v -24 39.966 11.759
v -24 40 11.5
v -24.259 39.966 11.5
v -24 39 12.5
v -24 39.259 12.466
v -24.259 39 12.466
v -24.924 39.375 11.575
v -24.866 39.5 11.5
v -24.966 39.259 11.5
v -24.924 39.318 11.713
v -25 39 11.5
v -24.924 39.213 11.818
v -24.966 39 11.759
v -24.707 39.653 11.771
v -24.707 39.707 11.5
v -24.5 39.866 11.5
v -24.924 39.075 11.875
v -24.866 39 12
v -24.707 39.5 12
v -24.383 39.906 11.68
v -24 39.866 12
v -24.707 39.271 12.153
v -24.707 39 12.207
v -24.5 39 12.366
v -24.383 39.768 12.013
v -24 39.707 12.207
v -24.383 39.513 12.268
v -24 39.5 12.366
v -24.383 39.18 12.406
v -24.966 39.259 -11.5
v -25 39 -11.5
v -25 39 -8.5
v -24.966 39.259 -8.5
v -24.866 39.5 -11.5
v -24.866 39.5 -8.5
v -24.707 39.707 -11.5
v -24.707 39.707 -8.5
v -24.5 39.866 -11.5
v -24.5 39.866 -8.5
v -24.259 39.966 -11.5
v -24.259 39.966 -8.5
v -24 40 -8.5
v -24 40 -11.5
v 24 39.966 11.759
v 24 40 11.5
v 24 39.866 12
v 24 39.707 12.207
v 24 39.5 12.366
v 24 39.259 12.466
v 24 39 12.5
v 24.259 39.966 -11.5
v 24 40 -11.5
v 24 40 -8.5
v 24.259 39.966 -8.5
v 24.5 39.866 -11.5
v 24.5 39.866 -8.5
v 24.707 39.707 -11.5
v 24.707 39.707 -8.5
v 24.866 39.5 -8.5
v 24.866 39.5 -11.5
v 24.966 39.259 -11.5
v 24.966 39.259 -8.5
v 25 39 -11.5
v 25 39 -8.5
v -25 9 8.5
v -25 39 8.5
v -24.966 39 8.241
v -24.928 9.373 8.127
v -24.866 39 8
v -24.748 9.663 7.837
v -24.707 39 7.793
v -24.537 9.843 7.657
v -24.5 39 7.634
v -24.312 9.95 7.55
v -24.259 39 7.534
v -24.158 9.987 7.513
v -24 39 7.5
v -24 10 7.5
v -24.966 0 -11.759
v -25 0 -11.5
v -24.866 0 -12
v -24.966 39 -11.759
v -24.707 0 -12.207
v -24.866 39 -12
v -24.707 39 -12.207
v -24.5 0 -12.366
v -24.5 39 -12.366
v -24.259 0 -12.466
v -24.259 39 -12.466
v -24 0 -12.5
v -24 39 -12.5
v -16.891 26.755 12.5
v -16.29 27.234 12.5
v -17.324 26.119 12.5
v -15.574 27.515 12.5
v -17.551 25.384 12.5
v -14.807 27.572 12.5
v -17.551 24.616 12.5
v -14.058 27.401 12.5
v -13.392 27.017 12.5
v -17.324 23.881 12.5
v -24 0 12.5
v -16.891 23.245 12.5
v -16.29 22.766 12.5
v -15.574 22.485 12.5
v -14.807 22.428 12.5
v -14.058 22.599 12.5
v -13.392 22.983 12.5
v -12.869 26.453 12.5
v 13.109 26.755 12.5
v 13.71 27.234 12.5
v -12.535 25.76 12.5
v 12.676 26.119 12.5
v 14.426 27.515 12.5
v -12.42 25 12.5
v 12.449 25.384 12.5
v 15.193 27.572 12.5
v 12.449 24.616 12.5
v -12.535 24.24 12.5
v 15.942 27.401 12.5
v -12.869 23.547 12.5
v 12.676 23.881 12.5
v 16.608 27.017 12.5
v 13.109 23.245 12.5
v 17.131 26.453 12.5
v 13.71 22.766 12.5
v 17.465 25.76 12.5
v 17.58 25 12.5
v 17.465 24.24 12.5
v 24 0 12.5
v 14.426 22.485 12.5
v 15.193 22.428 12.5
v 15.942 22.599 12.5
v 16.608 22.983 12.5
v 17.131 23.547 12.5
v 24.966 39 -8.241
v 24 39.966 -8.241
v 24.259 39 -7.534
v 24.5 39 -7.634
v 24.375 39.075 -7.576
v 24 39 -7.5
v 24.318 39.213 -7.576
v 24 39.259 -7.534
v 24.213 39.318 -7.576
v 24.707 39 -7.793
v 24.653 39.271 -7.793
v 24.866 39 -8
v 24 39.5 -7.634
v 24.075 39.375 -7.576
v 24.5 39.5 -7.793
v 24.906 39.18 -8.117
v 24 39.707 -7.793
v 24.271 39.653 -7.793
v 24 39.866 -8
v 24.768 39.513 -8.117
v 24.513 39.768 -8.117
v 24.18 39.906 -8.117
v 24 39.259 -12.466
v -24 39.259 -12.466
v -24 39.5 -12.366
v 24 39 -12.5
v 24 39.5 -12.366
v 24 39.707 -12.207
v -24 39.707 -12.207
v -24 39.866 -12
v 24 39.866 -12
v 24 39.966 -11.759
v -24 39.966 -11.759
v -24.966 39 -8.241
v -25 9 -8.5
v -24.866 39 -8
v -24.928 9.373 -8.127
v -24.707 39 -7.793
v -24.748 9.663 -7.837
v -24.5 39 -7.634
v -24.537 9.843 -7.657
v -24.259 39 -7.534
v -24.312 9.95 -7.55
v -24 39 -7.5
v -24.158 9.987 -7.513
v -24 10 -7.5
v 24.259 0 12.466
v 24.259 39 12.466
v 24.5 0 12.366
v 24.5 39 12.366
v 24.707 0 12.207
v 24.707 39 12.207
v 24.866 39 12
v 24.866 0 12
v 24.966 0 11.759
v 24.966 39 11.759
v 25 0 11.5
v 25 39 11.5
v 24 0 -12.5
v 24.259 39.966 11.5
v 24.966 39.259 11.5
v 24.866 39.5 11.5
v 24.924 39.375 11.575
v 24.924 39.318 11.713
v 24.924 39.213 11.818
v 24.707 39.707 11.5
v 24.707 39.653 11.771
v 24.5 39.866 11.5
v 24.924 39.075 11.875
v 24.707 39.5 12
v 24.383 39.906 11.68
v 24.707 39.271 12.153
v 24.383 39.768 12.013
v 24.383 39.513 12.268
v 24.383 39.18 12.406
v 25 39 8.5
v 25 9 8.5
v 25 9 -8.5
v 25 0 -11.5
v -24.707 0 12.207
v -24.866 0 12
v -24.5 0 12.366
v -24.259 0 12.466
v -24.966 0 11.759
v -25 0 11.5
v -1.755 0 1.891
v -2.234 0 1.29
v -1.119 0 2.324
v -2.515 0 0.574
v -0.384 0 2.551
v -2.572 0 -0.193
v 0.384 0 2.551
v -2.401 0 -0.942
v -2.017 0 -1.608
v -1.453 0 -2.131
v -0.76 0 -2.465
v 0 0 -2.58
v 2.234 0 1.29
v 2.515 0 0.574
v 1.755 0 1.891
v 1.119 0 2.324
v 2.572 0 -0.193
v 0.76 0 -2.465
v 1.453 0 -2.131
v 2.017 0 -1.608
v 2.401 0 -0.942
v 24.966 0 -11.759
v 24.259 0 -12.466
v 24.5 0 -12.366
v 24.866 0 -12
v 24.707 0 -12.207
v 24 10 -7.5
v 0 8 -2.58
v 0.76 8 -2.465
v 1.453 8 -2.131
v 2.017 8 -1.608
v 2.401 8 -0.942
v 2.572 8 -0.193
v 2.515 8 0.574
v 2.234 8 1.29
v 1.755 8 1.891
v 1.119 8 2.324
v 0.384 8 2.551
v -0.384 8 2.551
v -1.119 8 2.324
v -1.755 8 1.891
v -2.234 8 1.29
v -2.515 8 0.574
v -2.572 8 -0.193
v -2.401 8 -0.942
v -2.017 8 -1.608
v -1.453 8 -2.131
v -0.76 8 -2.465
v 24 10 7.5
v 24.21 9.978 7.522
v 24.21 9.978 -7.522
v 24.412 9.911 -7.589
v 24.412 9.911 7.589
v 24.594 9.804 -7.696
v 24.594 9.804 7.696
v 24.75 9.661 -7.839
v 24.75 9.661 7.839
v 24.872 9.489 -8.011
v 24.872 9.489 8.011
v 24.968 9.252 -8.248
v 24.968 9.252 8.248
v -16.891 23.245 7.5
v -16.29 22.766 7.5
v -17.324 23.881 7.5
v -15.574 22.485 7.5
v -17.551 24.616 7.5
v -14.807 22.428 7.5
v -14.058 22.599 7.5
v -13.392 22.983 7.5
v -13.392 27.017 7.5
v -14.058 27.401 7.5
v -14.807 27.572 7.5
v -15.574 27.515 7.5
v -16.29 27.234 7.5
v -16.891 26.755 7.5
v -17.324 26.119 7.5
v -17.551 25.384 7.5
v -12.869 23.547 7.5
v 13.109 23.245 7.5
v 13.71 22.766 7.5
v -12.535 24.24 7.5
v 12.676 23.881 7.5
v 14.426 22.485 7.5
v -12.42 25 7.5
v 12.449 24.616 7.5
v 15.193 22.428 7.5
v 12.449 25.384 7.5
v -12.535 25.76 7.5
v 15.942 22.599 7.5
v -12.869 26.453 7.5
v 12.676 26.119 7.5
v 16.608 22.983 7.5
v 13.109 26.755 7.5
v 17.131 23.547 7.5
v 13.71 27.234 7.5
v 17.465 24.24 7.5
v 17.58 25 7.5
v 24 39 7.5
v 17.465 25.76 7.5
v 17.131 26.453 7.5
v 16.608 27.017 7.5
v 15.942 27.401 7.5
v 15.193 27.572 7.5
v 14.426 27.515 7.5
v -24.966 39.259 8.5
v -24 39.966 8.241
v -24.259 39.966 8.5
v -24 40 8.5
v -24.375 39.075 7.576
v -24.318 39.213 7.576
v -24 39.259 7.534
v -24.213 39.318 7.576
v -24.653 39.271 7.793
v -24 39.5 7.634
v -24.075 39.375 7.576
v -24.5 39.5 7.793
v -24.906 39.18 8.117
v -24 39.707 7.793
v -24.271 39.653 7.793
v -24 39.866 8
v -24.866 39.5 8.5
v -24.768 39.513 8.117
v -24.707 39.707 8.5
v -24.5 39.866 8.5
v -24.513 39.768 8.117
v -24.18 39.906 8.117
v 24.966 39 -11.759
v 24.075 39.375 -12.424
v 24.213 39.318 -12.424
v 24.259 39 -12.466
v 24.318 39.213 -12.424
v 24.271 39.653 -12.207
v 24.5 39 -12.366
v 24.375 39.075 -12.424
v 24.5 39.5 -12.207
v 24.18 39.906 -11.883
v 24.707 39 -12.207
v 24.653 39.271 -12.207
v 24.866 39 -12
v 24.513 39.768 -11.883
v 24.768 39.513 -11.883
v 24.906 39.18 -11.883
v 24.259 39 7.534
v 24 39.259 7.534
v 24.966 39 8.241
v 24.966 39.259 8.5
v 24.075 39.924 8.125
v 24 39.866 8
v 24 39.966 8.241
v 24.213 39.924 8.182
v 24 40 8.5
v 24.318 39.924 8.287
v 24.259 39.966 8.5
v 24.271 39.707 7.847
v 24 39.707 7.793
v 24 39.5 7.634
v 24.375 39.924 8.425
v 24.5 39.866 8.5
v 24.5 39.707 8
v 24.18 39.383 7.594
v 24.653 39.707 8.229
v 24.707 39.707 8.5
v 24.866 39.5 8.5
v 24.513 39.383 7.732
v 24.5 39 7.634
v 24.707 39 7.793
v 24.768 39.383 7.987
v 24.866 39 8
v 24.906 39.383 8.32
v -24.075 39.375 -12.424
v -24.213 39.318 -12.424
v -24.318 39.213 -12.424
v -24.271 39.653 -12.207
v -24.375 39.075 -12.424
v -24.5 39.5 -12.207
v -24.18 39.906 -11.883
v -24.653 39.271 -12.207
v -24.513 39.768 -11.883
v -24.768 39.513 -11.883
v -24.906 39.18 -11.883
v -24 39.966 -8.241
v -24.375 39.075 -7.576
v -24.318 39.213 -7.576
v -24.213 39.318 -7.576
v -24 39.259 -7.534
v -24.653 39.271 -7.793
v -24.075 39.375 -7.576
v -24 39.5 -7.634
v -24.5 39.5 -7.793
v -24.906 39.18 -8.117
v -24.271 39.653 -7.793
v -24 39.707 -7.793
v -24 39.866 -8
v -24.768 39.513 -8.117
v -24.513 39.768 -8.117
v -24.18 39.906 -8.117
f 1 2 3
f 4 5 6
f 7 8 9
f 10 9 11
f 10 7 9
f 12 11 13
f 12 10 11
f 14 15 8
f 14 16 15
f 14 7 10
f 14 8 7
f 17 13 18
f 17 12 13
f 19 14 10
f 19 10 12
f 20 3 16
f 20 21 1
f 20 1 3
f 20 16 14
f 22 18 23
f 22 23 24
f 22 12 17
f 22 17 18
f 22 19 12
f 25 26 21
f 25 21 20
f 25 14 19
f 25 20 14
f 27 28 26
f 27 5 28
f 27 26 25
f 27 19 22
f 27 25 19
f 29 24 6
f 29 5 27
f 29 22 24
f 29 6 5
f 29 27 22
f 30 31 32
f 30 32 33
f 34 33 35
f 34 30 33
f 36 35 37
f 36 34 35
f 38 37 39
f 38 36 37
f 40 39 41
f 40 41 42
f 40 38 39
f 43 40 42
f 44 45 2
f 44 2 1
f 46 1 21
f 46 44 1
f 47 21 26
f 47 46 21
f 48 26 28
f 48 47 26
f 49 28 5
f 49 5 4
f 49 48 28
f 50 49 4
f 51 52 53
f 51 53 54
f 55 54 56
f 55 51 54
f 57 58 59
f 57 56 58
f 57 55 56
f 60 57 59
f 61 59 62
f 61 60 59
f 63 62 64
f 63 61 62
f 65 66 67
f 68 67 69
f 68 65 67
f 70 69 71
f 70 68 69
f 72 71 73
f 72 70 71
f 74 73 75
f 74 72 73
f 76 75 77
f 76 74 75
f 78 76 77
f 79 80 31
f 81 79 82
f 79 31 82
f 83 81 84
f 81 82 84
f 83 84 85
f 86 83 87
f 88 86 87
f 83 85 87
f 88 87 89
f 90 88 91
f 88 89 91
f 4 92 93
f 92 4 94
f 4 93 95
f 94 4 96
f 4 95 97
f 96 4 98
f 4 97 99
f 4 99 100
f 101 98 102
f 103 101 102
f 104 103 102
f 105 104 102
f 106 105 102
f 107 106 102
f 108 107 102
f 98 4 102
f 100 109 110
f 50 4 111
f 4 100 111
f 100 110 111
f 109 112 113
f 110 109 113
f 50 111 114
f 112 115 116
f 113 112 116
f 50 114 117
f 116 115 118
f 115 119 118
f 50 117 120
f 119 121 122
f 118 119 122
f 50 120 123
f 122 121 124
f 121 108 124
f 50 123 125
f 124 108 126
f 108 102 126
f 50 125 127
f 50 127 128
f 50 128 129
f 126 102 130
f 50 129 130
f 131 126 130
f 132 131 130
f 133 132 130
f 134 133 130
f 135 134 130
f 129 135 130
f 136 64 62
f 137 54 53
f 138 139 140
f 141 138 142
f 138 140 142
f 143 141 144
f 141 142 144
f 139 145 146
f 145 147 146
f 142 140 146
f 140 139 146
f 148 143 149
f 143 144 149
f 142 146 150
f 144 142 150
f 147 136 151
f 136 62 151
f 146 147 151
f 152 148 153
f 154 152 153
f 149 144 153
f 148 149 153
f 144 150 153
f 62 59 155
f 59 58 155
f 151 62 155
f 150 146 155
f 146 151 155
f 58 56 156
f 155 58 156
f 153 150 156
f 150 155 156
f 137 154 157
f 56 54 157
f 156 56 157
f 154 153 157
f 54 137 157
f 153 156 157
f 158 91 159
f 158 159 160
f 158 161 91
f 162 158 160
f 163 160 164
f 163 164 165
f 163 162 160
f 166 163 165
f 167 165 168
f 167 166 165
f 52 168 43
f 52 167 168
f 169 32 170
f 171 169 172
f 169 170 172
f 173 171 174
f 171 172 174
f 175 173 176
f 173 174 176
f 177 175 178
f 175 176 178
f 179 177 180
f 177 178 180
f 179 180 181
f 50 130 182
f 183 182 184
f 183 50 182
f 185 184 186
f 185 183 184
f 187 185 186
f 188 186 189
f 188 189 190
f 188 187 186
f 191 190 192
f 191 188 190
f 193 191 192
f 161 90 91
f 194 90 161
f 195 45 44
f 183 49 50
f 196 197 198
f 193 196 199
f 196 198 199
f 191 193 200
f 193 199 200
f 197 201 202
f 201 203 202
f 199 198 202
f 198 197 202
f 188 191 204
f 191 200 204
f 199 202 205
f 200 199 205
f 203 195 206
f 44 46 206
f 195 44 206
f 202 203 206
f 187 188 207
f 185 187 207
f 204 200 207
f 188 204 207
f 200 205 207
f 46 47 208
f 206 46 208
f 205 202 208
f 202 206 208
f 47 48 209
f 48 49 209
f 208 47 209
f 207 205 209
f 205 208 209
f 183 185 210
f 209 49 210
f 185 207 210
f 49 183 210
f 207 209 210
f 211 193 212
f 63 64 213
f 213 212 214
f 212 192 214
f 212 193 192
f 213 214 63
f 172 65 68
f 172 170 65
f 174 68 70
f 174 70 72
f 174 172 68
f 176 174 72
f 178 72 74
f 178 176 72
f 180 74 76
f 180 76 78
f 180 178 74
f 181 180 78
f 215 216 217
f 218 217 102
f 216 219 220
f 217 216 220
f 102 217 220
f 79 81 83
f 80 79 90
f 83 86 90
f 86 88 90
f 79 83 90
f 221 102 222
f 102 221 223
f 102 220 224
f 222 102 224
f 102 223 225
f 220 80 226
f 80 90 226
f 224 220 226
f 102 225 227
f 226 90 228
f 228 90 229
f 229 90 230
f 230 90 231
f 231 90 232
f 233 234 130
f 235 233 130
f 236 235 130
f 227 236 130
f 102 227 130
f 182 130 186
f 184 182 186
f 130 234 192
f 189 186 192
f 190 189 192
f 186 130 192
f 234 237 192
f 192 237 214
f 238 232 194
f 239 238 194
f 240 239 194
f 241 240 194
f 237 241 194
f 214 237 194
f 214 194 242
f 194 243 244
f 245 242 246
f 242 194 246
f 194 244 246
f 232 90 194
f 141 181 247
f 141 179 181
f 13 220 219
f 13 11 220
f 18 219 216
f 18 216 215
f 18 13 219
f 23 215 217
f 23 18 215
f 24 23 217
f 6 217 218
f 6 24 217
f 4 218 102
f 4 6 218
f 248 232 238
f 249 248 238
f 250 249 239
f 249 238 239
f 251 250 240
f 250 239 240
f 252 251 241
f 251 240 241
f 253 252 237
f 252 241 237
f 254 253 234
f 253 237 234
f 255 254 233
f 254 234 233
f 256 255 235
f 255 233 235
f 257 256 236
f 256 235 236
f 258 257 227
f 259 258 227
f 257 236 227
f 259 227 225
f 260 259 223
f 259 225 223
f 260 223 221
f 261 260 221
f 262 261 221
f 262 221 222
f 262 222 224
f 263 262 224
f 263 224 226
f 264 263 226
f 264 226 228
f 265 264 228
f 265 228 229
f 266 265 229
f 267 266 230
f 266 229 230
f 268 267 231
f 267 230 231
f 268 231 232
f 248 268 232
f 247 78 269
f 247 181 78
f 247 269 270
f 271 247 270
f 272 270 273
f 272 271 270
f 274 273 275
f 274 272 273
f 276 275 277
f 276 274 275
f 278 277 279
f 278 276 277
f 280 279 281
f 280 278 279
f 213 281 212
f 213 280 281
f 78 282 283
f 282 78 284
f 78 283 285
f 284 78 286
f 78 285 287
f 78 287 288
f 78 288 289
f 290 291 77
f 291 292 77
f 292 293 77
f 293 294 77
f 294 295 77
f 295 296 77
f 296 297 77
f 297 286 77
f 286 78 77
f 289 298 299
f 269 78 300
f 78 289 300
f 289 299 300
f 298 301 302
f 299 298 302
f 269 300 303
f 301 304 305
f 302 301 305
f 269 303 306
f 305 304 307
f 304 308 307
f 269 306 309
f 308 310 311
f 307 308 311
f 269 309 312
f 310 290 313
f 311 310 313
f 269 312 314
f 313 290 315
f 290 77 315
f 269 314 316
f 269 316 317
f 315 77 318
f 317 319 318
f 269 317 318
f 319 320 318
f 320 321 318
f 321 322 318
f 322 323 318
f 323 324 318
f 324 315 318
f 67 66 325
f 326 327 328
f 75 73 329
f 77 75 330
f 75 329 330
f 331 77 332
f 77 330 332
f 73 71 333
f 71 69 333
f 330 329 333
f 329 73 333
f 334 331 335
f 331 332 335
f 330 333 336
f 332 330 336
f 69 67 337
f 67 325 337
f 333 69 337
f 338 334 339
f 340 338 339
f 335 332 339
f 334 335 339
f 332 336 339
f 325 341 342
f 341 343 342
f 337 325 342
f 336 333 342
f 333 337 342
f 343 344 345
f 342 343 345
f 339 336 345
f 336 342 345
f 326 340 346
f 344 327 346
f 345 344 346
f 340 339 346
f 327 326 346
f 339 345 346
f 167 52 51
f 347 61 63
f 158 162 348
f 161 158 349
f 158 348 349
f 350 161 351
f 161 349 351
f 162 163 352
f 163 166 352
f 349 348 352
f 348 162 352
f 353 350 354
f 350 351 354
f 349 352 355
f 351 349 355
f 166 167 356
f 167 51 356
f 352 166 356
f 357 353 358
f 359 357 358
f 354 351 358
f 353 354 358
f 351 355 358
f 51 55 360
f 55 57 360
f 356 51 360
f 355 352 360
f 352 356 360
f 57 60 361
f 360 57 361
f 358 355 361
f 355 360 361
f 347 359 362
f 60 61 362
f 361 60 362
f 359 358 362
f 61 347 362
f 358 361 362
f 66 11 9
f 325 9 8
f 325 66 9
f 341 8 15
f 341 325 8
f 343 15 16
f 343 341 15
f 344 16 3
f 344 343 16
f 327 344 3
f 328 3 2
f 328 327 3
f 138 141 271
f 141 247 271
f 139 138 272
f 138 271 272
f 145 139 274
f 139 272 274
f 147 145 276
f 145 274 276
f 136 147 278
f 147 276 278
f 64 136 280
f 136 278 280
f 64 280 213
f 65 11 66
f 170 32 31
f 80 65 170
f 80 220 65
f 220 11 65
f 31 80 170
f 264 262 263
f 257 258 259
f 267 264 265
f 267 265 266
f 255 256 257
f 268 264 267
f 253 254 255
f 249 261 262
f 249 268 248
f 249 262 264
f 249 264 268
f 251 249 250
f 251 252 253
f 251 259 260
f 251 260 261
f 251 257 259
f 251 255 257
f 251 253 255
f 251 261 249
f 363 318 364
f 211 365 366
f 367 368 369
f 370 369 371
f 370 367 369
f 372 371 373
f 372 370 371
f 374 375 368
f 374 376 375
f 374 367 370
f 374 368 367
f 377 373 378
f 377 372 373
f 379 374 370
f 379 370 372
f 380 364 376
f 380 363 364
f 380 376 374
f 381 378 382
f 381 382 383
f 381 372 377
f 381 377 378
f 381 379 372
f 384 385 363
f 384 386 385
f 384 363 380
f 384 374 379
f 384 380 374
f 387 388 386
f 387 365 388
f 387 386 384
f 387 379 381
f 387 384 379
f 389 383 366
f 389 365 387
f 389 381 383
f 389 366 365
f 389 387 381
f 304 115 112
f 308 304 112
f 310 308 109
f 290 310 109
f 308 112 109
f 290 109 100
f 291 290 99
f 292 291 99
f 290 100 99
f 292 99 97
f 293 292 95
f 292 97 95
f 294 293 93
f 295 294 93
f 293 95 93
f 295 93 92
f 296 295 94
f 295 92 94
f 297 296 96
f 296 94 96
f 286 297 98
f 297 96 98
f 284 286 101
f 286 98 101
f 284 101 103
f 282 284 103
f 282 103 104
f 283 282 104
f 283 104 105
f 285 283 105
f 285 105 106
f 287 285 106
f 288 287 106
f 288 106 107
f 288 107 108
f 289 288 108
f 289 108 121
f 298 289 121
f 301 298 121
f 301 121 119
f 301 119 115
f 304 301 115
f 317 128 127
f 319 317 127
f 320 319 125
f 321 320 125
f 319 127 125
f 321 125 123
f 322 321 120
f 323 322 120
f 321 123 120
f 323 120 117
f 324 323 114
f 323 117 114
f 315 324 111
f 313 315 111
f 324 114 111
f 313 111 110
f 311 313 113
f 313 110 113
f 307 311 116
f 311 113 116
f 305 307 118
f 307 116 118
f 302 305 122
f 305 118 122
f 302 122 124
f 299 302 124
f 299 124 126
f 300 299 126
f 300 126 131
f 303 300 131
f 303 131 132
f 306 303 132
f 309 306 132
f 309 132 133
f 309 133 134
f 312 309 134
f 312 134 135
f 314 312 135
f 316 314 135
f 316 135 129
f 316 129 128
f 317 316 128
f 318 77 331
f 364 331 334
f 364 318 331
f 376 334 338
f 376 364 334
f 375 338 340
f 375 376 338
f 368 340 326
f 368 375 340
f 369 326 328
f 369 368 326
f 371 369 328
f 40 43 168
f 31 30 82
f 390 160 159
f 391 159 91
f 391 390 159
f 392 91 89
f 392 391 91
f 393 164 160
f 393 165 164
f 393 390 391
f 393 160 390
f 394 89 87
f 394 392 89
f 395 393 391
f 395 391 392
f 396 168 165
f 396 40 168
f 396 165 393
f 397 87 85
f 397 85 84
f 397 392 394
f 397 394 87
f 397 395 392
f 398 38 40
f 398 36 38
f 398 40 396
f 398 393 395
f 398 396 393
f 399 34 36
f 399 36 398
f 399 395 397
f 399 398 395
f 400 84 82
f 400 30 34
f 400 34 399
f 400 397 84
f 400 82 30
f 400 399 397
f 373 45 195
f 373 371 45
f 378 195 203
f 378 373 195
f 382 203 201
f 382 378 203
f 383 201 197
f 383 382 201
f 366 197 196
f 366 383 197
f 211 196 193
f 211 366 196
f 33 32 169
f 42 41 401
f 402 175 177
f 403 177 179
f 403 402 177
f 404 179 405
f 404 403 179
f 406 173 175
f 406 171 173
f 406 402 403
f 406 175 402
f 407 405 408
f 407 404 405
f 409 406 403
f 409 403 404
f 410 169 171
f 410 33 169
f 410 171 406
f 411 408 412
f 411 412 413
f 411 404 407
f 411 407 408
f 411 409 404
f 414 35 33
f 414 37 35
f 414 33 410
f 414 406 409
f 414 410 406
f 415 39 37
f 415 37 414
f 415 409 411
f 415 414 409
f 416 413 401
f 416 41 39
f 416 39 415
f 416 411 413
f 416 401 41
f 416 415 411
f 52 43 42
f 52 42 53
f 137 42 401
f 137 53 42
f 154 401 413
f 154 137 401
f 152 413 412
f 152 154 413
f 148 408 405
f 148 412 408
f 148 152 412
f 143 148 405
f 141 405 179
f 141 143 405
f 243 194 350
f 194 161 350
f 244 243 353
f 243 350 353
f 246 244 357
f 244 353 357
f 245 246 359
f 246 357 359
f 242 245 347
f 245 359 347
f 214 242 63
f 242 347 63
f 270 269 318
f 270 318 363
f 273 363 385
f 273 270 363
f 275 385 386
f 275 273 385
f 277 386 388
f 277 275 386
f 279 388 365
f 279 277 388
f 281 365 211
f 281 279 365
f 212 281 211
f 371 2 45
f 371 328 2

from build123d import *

# Parameters (mm, degrees)
SKETCH1_W           = 50
SKETCH1_H           = 25
BOSS_EXTRUDE1_DEPTH = 40
SKETCH2_W           = 50
SKETCH2_H           = 15
CUT_EXTRUDE1_DEPTH  = 30
FILLET1_R           = 1
CUT_EXTRUDE2_REACH  = 55.385
SKETCH3_R           = 2.5796875
SKETCH3_R_2         = 2.579687
SKETCH4_R           = 2.57968
CUT_EXTRUDE3_DEPTH  = 8


with BuildPart() as part:
    # Sketch1 → Boss-Extrude1 (new body)
    with BuildSketch(Plane(origin=(0, 0, 0), x_dir=(1, 0, 0), z_dir=(0, 1, 0))):
        Rectangle(SKETCH1_W, SKETCH1_H)
    extrude(amount=BOSS_EXTRUDE1_DEPTH)

    # Sketch2 → Cut-Extrude1 (cut)
    with BuildSketch(Plane(origin=(0, 40, 0), x_dir=(1, 0, 0), z_dir=(0, 1, 0))):
        Rectangle(SKETCH2_W, SKETCH2_H)
    extrude(amount=-CUT_EXTRUDE1_DEPTH, mode=Mode.SUBTRACT)

    # Fillet1
    fillet1_edges = [part.edges().sort_by_distance(p)[0] for p in [
        (-25, 40, -10),
        (0, 40, 12.5),
        (25, 40, -10),
        (-25, 40, 10),
        (25, 10, 0),
        (25, 25, -7.5),
        (25, 25, 7.5),
        (-25, 10, 0),
        (-25, 25, 7.5),
        (-25, 25, -7.5),
        (0, 40, -7.5),
        (0, 40, 7.5),
        (25, 40, 10),
        (0, 40, -12.5),
        (25, 20, 12.5),
        (-25, 20, 12.5),
        (-25, 20, -12.5),
        (25, 20, -12.5),
    ]]
    fillet(fillet1_edges, radius=FILLET1_R)

    # Sketch3 → Cut-Extrude2 (cut, up to next)
    with BuildSketch(Plane.XY.offset(12.5), mode=Mode.PRIVATE) as cut_extrude2_sk1:
        with Locations((-15, 25)):
            Circle(SKETCH3_R)
    cut_extrude2_tool1 = extrude(cut_extrude2_sk1.sketch, amount=-CUT_EXTRUDE2_REACH, mode=Mode.PRIVATE) & part.part
    # Sketch3 → Cut-Extrude2 (cut, up to next)
    with BuildSketch(Plane.XY.offset(12.5), mode=Mode.PRIVATE) as cut_extrude2_sk2:
        with Locations((15, 25)):
            Circle(SKETCH3_R_2)
    cut_extrude2_tool2 = extrude(cut_extrude2_sk2.sketch, amount=-CUT_EXTRUDE2_REACH, mode=Mode.PRIVATE) & part.part
    add(cut_extrude2_tool1.solids().sort_by_distance((-15, 25, 12.5))[0], mode=Mode.SUBTRACT)
    add(cut_extrude2_tool2.solids().sort_by_distance((15, 25, 12.5))[0], mode=Mode.SUBTRACT)

    # Sketch4 → Cut-Extrude3 (cut)
    with BuildSketch(Plane(origin=(0, 0, 0), x_dir=(-1, 0, 0), z_dir=(0, -1, 0))):
        with Locations(Location((0, 0, 0), (0, 0, 90))):
            Circle(SKETCH4_R)
    extrude(amount=-CUT_EXTRUDE3_DEPTH, mode=Mode.SUBTRACT)


solid = part.part
